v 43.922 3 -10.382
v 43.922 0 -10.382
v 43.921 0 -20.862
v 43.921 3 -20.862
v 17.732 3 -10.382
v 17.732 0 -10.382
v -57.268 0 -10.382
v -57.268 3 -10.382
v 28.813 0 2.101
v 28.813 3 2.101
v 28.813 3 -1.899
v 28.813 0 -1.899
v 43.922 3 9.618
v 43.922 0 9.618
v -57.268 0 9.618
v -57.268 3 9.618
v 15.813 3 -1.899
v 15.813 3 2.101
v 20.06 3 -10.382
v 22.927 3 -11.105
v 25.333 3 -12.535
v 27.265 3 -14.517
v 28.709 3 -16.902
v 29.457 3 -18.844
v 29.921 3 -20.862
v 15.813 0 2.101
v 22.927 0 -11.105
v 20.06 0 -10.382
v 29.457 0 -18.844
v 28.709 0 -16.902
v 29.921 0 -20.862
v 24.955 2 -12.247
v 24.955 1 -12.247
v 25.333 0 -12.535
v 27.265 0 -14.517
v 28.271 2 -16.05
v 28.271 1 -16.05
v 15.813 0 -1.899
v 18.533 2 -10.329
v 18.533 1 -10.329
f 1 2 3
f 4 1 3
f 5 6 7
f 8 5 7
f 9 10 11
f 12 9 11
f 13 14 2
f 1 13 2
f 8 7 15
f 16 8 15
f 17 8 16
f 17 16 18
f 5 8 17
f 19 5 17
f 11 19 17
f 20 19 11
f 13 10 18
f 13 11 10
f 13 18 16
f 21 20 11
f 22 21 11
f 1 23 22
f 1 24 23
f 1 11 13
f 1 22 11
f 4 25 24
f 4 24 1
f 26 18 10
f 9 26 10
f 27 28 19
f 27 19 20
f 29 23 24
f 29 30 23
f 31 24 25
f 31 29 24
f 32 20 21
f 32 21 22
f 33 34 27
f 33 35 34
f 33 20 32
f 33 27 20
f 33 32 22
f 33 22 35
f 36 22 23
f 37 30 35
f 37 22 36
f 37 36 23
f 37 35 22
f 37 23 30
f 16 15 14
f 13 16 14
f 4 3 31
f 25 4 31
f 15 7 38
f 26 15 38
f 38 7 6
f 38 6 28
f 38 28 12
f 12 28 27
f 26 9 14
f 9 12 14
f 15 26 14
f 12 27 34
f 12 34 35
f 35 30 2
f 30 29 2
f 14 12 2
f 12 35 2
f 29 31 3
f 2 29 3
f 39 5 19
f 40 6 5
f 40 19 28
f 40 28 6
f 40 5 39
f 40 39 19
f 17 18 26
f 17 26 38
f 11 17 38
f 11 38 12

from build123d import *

# Parameters (mm, degrees)
EXTRUDE_1_DEPTH     = 3
SKETCH_4_W          = 13
SKETCH_4_H          = 4
CUT_EXTRUDE_1_DEPTH = 62.023006498


with BuildPart() as part:
    # 草图2 → 凸台-拉伸1 (new body)
    with BuildSketch(Plane(origin=(0, 0, 0), x_dir=(1, 0, 0), z_dir=(0, 1, 0))):
        with BuildLine():
            Line((17.732480436, 10.381771038), (-57.267519564, 10.381771038))
            Line((-57.267519564, 10.381771038), (-57.267519564, -9.618228962))
            Line((-57.267519564, -9.618228962), (43.922480436, -9.618228962))
            Line((43.922480436, -9.618228962), (43.922480436, 10.381771038))
            Line((43.922480436, 10.381771038), (20.060175686, 10.381771038))
            add(Edge.make_bspline(
                [(17.732480436, 10.381771038), (18.54587785, 10.302233399), (19.322070314, 10.305337221), (20.060175686, 10.381771038)],
                knots=[0, 0, 0, 0, 0.115465336, 0.115465336, 0.115465336, 0.115465336], degree=3))
        make_face()
        with BuildLine():
            add(Edge.make_bspline(
                [(20.060175686, 10.381771038), (25.714511546, 10.96730054), (29.13370972, 15.856194464), (29.921192775, 20.862370643)],
                knots=[0.115465336, 0.115465336, 0.115465336, 0.115465336, 1, 1, 1, 1], degree=3))
            Line((20.060175686, 10.381771038), (43.922480436, 10.381771038))
            Line((43.922480436, 10.381771038), (43.921192775, 20.862370643))
            Line((43.921192775, 20.862370643), (29.921192775, 20.862370643))
        make_face()
    extrude(amount=EXTRUDE_1_DEPTH)

    # 草图4 → 切除-拉伸1 (cut, through all)
    with BuildSketch(Plane(origin=(0, 3, 0), x_dir=(1, 0, 0), z_dir=(0, 1, 0))):
        with Locations((22.312601946, -0.100962334)):
            Rectangle(SKETCH_4_W, SKETCH_4_H)
    extrude(amount=-CUT_EXTRUDE_1_DEPTH, mode=Mode.SUBTRACT)


solid = part.part
